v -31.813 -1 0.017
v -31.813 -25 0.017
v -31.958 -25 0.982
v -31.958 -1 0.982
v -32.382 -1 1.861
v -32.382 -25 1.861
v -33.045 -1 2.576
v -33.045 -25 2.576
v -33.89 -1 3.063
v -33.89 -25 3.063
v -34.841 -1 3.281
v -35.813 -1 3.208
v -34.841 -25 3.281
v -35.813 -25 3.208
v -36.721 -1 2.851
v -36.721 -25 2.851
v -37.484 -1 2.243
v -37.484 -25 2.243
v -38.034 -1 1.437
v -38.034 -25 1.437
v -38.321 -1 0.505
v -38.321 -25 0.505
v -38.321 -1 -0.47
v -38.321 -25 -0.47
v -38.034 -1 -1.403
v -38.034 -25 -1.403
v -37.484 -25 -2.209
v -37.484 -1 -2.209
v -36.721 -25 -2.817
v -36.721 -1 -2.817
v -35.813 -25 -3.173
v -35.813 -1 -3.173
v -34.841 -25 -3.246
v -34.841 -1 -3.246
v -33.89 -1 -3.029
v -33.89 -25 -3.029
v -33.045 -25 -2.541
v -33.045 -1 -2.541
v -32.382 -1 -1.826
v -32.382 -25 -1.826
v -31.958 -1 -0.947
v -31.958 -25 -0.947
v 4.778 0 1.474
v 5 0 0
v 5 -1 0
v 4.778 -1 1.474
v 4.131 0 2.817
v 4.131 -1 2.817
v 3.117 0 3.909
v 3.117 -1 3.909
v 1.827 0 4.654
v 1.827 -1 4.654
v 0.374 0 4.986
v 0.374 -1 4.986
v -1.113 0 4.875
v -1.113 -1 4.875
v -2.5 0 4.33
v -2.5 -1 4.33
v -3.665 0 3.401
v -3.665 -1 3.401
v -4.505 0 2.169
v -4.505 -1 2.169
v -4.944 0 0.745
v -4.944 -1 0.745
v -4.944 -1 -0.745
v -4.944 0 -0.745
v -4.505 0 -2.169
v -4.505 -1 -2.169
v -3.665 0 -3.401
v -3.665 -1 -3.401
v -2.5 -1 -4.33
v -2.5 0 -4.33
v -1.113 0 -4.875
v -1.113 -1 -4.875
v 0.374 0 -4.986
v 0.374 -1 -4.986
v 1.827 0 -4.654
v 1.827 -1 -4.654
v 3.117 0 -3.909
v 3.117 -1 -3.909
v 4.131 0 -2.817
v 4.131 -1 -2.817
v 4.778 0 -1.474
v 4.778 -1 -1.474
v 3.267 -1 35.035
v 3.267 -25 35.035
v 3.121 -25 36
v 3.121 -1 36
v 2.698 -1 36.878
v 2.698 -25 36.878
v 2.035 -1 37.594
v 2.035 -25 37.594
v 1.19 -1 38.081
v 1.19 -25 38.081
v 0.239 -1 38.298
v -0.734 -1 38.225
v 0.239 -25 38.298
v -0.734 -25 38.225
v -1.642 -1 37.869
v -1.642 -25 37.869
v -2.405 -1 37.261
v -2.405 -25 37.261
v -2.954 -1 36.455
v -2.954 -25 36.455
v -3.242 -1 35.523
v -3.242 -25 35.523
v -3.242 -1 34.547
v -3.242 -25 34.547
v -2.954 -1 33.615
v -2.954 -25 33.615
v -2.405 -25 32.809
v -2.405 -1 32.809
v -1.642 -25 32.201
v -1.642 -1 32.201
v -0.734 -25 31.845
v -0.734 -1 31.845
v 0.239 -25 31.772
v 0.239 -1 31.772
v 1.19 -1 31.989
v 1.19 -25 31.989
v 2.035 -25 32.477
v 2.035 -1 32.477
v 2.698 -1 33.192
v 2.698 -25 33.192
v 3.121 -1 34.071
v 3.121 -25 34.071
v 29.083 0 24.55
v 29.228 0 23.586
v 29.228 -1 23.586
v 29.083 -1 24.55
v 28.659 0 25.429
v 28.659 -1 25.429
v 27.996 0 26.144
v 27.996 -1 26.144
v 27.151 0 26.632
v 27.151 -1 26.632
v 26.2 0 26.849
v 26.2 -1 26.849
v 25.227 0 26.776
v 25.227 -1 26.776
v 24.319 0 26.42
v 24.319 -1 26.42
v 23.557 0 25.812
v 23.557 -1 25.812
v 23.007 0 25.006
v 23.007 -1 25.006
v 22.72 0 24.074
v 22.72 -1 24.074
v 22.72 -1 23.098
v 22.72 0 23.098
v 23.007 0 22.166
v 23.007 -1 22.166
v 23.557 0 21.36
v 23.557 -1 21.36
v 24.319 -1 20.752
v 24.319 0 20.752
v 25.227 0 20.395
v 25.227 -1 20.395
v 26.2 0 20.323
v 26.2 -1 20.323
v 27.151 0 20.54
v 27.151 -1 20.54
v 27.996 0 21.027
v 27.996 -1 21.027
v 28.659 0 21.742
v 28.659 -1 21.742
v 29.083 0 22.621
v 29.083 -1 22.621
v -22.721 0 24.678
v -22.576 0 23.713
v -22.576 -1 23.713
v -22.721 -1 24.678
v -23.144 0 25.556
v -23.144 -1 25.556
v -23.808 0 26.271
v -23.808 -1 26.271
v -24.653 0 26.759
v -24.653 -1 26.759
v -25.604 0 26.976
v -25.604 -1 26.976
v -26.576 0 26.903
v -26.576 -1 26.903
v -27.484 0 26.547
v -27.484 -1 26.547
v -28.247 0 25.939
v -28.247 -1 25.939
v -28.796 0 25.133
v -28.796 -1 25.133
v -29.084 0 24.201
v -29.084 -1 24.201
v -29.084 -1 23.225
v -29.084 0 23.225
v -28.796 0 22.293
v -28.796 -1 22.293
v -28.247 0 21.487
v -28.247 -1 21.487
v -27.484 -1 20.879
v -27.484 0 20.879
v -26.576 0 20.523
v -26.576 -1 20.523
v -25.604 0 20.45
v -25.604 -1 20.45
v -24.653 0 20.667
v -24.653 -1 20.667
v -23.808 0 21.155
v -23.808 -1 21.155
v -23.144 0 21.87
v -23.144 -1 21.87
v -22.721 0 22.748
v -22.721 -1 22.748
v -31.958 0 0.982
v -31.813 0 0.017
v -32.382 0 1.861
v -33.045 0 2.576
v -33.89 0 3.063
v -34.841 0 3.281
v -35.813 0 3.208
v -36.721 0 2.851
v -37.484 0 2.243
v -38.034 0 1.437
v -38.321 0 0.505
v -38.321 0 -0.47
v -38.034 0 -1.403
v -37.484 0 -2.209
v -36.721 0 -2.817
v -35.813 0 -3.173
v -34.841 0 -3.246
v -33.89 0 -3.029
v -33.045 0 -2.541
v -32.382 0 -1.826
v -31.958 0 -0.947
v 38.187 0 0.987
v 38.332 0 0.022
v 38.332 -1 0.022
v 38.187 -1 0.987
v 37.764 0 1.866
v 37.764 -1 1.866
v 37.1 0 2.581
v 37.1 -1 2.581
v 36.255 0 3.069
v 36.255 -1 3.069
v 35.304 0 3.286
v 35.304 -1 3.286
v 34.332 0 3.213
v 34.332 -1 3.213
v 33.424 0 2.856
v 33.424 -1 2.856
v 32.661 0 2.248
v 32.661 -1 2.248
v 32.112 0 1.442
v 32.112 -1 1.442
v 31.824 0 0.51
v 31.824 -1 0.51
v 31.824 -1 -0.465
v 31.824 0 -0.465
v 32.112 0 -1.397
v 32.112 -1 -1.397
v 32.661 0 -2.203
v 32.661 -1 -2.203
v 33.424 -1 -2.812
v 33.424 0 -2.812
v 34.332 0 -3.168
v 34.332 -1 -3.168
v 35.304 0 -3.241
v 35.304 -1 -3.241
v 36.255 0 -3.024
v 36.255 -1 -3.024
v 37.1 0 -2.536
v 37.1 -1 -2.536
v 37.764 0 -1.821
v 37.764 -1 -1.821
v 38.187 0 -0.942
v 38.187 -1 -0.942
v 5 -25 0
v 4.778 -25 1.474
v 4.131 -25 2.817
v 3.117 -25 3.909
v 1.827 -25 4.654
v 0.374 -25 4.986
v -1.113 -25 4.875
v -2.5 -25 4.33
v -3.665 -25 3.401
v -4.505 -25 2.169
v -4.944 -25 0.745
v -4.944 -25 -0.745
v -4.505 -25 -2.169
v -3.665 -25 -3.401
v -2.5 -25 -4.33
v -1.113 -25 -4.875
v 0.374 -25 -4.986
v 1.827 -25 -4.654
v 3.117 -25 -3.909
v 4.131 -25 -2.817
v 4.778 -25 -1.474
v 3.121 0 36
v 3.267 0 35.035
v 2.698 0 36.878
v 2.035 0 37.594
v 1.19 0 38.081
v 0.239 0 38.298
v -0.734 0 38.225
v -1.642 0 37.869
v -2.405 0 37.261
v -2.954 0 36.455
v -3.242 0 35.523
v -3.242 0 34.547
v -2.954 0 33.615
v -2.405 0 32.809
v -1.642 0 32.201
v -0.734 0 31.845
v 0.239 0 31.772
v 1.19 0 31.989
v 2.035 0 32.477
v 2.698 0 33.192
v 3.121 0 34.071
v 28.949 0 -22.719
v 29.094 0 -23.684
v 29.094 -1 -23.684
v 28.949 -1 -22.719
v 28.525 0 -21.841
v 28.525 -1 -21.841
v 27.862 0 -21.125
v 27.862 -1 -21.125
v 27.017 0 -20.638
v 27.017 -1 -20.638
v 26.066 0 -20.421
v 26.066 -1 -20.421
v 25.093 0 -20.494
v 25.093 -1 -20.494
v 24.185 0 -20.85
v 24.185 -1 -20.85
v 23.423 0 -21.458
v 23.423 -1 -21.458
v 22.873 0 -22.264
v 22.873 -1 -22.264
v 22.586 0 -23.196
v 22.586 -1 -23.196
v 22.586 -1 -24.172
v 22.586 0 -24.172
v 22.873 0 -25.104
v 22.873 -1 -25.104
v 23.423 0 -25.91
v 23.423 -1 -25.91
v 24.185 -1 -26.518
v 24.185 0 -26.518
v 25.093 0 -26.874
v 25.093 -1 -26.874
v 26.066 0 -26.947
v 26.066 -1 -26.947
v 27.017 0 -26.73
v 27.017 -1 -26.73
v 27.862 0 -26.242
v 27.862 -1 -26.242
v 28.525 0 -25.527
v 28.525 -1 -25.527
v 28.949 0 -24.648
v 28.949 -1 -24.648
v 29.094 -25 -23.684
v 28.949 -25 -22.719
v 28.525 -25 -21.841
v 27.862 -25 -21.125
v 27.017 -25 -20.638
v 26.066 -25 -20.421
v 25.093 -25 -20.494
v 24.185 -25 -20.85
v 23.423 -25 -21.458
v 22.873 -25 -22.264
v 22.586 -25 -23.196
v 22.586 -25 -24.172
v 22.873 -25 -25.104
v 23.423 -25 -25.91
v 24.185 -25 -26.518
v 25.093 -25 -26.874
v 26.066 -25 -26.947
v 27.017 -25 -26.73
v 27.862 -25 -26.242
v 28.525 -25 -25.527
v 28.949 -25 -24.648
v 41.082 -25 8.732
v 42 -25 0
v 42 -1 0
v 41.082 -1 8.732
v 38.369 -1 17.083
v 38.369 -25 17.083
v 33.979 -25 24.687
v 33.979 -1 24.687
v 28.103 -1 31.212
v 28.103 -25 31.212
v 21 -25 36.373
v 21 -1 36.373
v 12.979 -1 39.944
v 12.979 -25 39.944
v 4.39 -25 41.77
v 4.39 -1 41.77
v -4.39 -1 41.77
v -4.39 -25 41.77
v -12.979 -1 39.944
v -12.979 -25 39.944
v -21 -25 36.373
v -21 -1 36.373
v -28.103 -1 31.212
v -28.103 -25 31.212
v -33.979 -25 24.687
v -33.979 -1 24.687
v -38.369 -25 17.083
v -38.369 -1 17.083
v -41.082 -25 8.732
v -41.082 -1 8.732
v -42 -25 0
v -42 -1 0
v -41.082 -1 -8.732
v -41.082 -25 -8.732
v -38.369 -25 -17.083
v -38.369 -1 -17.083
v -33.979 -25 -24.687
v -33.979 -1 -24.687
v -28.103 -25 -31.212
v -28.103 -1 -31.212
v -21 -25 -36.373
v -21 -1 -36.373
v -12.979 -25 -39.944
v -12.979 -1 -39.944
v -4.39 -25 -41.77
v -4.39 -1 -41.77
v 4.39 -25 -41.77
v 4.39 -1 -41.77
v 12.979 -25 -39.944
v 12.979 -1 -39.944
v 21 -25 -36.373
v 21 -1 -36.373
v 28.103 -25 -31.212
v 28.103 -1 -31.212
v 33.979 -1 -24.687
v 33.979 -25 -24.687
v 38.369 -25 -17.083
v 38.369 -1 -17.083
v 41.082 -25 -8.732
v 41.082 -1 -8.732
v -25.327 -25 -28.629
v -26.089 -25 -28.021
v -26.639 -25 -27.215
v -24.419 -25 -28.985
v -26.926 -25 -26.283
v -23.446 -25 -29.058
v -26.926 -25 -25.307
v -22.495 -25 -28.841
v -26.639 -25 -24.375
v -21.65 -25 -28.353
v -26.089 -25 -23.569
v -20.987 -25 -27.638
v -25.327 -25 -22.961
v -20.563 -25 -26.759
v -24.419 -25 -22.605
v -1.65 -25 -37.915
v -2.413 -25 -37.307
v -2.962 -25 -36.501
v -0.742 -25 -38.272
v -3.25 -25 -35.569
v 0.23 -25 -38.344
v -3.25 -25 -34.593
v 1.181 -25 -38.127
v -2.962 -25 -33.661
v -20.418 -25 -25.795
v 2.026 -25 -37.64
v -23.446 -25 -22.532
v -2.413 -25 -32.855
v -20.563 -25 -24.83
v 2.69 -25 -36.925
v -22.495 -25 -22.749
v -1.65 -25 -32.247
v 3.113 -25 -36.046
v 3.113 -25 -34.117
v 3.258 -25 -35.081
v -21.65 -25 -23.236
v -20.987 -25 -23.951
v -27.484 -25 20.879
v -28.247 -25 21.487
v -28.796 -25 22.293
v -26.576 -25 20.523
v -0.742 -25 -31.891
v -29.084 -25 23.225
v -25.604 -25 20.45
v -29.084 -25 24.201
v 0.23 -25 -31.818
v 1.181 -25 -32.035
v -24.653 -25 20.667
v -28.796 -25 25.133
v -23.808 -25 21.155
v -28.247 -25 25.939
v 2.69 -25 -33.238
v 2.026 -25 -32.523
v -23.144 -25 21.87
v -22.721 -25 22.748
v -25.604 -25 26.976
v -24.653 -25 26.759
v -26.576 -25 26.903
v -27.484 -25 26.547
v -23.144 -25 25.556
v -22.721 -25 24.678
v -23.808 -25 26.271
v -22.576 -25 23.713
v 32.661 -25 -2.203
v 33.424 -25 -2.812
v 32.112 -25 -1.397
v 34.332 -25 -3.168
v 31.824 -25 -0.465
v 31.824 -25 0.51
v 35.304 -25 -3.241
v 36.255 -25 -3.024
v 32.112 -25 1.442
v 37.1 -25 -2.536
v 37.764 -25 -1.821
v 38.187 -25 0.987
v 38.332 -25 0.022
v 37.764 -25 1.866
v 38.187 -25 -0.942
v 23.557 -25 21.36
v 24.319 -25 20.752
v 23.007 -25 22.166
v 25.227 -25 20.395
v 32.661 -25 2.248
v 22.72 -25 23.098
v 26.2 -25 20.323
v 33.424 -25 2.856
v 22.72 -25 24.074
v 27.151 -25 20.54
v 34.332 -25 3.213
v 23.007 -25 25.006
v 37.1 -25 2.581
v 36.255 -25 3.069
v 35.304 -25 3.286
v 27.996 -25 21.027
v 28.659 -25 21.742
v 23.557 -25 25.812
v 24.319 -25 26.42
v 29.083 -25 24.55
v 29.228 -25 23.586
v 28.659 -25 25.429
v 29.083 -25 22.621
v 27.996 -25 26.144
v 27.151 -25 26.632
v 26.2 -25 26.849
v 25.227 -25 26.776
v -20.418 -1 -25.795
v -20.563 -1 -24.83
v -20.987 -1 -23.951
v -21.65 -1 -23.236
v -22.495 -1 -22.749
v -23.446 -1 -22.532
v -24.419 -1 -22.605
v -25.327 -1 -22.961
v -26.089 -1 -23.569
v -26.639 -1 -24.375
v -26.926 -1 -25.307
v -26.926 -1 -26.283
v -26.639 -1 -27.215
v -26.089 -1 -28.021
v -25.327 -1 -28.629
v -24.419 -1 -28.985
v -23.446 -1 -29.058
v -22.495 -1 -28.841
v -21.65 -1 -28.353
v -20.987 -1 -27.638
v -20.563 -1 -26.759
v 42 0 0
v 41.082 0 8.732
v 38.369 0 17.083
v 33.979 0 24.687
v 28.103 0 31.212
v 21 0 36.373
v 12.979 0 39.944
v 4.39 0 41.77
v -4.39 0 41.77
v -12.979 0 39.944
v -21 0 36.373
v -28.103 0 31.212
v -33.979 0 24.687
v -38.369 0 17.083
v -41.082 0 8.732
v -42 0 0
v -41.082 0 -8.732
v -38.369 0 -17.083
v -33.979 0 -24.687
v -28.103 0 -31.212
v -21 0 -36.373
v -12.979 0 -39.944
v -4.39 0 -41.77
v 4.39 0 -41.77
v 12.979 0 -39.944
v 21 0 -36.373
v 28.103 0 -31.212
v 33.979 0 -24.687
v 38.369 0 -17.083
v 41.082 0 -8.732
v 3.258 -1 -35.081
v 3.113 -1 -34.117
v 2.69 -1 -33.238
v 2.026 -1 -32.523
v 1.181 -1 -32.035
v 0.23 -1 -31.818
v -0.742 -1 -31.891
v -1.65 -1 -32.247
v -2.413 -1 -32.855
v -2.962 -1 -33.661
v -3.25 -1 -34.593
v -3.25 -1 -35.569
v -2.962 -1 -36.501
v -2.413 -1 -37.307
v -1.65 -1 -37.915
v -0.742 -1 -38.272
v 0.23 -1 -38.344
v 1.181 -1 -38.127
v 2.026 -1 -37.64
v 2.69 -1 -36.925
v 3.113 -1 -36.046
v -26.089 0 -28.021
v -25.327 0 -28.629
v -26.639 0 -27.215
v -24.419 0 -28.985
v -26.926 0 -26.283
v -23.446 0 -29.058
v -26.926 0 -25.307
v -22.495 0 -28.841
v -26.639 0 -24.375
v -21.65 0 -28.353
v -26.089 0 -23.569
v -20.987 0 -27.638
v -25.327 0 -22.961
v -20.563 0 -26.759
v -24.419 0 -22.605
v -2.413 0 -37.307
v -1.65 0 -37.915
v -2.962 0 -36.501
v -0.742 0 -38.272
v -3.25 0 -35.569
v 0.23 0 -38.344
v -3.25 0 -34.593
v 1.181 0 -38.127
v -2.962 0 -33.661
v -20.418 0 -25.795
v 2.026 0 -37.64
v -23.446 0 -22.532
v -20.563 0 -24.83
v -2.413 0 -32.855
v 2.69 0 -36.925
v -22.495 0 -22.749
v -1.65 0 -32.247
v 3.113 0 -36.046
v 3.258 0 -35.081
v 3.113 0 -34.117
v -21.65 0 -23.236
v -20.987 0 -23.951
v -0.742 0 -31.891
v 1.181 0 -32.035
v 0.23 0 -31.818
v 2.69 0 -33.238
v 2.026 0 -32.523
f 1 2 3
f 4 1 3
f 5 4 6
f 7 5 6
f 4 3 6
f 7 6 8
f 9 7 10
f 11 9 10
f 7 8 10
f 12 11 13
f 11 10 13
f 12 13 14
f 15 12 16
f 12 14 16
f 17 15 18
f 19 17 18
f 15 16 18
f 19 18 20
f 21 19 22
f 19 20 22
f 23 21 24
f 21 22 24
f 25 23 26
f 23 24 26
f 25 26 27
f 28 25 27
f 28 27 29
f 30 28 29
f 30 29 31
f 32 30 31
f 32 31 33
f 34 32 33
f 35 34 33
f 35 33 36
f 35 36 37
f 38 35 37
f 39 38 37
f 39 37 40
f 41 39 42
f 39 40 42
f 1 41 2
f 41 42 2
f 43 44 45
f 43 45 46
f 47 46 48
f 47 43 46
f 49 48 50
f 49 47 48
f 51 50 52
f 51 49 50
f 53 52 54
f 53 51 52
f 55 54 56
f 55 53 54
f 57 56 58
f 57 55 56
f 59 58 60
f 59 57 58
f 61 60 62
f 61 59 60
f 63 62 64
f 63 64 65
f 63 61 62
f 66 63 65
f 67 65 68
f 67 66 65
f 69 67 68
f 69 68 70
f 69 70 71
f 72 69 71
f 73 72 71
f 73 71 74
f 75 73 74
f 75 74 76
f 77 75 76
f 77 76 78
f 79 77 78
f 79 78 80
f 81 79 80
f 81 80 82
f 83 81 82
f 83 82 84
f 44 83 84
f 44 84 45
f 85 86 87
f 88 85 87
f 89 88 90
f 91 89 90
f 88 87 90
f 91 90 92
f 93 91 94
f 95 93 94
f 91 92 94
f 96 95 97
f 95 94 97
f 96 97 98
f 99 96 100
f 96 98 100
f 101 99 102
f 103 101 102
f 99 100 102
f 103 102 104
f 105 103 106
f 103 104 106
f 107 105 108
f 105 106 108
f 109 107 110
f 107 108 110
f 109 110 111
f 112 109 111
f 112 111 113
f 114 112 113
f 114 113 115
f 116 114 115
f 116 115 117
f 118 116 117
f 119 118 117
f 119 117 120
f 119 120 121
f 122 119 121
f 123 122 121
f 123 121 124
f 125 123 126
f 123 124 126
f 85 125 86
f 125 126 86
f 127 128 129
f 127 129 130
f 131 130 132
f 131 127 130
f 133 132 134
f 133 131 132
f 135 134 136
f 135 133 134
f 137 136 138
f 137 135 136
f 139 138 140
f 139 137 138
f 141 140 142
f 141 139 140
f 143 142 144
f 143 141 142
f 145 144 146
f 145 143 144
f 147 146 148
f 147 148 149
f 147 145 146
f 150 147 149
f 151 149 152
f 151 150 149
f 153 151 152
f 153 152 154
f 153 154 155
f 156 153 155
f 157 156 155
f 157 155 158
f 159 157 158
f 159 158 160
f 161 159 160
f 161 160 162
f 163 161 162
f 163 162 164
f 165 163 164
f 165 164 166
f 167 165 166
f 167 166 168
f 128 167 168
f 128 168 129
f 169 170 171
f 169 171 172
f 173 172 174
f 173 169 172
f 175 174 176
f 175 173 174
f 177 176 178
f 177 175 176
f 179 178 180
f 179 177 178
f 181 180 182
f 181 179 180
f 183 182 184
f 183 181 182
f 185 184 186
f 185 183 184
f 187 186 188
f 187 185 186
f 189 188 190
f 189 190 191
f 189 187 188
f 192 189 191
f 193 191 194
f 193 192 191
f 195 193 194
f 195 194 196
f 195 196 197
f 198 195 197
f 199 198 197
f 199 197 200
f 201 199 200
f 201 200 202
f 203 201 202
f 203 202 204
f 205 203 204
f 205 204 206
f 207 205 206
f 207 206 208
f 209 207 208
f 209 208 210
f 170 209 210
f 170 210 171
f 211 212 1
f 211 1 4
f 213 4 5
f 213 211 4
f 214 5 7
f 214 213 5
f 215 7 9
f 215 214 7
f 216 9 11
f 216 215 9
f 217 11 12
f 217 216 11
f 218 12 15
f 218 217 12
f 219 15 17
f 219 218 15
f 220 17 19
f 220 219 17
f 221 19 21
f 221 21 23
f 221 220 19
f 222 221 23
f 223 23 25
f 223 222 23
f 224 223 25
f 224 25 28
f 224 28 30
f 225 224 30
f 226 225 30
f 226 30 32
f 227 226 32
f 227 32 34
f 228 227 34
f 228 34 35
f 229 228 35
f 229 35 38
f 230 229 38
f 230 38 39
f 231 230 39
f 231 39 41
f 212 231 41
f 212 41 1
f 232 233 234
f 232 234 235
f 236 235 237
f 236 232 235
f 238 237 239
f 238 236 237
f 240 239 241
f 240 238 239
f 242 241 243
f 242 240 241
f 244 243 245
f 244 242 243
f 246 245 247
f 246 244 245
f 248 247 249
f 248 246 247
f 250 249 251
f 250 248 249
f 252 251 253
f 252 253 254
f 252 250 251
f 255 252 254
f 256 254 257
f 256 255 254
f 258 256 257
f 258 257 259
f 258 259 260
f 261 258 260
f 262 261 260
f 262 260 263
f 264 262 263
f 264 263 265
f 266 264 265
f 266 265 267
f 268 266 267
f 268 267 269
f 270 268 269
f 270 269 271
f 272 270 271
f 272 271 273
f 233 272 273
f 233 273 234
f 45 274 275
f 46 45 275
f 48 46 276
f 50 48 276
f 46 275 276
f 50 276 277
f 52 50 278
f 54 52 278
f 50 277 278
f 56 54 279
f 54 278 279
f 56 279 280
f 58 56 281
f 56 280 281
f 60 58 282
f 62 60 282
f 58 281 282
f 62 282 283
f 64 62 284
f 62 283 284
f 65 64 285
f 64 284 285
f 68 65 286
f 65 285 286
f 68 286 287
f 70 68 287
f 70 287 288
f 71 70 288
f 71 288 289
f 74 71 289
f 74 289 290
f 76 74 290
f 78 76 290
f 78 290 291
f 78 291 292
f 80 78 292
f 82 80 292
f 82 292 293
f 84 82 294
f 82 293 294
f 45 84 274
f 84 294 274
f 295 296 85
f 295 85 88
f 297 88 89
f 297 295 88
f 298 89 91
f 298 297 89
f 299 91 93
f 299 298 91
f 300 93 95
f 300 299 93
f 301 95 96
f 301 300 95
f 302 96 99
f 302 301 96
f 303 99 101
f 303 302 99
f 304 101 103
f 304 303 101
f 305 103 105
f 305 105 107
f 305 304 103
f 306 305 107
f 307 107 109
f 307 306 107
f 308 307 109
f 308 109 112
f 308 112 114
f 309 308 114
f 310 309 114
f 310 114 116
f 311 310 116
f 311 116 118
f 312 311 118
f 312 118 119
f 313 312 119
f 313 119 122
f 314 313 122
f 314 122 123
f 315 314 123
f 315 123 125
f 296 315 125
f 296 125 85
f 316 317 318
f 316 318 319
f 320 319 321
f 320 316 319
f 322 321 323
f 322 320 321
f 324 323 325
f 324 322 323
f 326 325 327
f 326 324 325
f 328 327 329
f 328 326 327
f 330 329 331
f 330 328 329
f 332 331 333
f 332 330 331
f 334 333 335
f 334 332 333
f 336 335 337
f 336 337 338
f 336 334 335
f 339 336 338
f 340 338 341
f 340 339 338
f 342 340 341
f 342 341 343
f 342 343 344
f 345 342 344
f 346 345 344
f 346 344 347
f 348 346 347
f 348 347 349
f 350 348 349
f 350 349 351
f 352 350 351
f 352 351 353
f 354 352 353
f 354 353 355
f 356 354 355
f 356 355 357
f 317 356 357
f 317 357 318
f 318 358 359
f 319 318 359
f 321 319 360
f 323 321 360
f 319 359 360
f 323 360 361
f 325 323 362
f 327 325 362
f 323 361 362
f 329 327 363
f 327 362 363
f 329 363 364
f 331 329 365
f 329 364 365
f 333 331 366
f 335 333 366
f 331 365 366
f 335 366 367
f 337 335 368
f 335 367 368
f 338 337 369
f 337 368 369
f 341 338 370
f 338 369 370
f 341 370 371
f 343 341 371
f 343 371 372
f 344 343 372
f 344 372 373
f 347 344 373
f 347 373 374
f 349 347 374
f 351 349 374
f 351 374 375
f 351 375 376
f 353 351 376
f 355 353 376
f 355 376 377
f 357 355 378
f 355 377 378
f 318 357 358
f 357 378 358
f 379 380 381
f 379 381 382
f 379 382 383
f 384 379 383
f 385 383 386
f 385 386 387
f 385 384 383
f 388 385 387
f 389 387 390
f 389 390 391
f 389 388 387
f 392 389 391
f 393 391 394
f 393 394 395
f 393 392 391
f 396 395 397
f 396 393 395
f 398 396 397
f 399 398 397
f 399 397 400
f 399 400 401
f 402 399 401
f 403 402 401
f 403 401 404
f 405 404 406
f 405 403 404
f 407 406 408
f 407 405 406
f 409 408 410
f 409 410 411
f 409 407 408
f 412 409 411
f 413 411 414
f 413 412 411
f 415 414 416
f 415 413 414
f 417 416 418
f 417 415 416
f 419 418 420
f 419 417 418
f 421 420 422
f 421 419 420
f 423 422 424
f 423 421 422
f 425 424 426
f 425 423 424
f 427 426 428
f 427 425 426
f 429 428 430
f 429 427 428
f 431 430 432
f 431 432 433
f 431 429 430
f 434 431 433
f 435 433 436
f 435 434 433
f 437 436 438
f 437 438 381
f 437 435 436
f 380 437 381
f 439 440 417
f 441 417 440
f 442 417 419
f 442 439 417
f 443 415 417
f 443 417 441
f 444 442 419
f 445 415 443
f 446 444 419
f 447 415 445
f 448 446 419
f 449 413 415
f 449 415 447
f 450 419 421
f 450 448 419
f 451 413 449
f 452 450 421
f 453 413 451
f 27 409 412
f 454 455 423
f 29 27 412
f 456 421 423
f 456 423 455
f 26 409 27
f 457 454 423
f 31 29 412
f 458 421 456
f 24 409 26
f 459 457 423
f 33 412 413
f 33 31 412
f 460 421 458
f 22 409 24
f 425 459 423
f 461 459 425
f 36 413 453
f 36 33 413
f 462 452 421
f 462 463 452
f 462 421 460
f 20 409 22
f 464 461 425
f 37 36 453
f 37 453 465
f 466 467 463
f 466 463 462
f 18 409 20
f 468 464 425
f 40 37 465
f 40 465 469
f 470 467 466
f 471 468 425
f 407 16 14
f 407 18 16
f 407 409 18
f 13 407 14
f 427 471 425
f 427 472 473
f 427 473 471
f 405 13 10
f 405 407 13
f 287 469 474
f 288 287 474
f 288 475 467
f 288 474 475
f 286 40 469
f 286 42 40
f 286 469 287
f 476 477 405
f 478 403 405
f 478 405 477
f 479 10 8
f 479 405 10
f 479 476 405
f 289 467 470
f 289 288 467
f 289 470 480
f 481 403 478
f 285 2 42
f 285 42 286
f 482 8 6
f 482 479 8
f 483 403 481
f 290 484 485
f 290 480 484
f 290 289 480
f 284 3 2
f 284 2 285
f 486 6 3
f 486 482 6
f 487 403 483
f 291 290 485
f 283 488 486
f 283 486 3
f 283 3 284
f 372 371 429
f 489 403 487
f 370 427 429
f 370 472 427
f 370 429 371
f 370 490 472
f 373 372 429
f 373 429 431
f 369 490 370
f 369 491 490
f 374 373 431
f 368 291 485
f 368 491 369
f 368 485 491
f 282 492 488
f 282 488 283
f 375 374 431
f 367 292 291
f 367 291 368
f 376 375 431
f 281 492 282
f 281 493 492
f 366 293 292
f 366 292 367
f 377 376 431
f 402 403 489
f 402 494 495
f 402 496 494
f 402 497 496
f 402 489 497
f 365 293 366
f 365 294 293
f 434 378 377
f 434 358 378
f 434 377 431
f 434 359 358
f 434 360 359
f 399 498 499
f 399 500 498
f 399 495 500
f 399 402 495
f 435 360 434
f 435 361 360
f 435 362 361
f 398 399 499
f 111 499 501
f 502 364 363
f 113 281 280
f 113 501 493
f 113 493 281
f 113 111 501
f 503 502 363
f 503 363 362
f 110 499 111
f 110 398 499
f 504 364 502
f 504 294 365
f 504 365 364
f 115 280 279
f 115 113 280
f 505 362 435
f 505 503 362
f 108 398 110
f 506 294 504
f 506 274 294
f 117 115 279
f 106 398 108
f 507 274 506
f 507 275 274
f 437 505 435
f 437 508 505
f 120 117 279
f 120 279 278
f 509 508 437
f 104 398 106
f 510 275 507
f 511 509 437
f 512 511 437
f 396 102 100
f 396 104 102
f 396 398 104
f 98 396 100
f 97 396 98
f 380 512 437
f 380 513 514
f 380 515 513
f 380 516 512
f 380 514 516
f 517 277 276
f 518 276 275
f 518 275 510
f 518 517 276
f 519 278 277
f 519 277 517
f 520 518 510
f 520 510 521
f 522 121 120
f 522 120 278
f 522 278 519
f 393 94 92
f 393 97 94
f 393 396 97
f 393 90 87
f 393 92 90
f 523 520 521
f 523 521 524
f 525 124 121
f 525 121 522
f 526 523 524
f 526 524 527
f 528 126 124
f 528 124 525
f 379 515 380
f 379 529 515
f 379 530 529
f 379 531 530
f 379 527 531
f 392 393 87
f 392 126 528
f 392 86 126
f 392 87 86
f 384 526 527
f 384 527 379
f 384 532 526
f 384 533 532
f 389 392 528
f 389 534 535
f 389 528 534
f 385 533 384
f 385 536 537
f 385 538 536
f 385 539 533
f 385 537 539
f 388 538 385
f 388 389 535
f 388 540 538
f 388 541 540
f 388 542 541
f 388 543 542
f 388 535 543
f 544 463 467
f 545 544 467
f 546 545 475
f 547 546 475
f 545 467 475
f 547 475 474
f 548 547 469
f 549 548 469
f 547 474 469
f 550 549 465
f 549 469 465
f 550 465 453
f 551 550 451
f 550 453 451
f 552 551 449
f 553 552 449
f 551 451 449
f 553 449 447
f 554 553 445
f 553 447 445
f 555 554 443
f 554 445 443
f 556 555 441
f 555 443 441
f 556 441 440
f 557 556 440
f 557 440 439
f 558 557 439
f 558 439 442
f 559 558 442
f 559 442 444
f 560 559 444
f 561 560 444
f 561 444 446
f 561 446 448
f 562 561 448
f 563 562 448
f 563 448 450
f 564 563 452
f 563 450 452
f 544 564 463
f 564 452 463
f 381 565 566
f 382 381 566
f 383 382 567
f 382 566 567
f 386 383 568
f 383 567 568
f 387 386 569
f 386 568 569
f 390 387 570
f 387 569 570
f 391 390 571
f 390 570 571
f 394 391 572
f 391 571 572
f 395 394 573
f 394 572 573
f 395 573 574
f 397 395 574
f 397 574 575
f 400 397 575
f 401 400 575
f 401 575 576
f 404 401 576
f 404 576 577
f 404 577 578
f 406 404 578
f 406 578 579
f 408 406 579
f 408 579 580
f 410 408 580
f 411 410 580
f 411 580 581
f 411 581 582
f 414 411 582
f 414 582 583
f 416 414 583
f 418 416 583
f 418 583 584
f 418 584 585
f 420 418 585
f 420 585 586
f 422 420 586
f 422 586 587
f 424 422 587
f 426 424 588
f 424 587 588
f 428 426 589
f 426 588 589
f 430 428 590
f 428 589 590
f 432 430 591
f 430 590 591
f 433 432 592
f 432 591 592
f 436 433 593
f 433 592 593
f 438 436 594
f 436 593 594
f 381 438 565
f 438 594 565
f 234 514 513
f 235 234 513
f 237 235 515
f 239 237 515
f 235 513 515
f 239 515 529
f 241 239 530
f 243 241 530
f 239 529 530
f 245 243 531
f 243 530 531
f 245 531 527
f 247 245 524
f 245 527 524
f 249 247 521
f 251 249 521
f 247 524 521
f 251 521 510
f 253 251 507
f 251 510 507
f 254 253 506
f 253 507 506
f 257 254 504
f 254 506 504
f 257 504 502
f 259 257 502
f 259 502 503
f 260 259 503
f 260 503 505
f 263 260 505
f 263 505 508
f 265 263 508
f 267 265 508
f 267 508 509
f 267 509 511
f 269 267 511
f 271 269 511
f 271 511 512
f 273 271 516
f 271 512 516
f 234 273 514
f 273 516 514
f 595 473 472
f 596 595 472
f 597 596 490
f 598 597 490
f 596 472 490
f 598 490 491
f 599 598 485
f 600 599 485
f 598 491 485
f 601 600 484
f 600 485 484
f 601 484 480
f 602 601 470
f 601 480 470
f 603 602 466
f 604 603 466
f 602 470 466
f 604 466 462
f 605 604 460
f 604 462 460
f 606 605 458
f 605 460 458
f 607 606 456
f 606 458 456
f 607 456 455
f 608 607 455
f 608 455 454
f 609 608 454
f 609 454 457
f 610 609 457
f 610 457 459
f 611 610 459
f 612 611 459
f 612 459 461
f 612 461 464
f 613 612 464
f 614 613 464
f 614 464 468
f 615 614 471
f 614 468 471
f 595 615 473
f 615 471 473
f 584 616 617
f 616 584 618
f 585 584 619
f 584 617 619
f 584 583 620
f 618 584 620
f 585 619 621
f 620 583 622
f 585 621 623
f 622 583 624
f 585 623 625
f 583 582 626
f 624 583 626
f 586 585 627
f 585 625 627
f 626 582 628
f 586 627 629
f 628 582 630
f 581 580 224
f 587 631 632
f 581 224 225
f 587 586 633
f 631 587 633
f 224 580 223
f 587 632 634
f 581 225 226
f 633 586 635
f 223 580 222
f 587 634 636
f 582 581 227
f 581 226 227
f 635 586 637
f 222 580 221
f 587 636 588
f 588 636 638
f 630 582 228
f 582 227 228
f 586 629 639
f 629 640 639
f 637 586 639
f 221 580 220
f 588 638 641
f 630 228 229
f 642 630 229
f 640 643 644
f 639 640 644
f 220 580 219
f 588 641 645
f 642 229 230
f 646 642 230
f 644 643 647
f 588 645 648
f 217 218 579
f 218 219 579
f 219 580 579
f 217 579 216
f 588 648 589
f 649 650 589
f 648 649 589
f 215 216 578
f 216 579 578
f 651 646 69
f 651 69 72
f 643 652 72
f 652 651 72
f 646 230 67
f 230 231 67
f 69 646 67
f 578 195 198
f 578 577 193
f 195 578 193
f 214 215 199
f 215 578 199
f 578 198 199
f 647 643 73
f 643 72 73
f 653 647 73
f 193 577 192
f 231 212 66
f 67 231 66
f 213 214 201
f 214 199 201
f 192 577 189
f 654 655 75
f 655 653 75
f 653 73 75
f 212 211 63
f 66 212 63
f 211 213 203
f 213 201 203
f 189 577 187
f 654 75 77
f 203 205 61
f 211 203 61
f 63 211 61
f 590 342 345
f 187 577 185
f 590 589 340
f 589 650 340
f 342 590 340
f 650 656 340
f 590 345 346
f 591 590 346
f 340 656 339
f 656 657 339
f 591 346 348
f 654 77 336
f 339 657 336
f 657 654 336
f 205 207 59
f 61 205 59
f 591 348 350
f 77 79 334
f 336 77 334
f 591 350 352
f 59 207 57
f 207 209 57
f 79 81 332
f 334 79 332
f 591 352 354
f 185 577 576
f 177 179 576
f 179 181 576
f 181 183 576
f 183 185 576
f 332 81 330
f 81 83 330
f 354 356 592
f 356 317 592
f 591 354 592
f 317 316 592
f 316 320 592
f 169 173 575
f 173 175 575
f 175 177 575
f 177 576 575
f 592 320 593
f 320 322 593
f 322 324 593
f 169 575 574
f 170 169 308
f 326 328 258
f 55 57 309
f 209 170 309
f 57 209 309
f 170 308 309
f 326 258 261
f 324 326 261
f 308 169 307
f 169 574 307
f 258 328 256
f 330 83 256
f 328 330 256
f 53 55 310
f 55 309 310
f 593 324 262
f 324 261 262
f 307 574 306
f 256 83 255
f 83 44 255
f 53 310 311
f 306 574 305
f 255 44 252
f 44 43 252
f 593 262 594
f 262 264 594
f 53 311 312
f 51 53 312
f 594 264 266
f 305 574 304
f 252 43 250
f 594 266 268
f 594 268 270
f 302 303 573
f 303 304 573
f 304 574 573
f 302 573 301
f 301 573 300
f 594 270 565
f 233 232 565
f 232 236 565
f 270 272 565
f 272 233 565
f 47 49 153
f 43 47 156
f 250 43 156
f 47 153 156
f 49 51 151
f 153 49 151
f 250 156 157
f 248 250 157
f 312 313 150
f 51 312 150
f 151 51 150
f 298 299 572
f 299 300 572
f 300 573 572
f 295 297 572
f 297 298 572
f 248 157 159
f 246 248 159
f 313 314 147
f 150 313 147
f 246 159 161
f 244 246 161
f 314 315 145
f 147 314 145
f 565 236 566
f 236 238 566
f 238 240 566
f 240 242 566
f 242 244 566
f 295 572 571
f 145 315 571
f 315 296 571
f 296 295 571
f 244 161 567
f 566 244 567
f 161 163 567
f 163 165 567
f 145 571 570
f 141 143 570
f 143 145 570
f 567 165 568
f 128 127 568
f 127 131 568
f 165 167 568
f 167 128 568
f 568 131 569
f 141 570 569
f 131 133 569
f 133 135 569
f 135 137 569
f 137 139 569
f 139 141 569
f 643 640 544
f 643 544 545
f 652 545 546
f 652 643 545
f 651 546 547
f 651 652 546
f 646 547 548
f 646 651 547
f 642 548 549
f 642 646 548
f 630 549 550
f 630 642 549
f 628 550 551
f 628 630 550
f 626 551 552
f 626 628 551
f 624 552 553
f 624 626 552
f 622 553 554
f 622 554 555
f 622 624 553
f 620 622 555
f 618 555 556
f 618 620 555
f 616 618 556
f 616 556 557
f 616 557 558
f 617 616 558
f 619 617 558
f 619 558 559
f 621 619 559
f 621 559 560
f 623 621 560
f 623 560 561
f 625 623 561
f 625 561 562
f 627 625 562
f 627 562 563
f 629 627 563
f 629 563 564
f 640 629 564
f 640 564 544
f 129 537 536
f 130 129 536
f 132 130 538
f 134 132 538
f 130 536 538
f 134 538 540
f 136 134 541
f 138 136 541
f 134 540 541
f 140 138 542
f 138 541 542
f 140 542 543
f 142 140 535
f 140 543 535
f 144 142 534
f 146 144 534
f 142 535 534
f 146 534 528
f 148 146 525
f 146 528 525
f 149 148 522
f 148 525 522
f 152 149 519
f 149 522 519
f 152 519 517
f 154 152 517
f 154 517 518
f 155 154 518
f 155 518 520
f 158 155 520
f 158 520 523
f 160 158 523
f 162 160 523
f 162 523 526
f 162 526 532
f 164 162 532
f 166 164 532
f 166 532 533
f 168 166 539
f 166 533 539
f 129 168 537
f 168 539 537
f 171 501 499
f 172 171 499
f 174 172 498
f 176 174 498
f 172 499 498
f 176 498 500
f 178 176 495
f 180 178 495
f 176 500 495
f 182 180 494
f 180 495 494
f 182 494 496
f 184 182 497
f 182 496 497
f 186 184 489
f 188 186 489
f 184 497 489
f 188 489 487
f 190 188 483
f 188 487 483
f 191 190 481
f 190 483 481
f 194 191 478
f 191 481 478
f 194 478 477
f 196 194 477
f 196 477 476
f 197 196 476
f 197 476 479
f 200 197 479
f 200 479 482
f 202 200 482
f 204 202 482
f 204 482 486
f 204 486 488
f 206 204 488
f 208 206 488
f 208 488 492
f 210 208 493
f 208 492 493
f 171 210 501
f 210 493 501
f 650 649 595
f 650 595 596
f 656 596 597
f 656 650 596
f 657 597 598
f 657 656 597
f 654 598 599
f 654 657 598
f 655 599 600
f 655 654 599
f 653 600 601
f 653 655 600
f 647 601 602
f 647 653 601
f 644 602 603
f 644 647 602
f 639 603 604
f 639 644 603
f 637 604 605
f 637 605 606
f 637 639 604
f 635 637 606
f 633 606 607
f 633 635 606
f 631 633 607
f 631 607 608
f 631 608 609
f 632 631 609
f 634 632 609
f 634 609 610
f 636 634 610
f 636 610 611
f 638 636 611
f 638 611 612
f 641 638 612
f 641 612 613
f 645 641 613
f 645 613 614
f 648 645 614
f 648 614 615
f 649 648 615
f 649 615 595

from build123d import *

# Parameters (mm, degrees)
F0_R     = 42
F0_R_2   = 3.2723941489
F0_R_3   = 15
F0_R_4   = 8.75
F1_DEPTH = 25
F0_R_5   = 5
F2_DEPTH = 25
F7_DEPTH = 24


# Not quite as in the source:
# - the program builds the solid bodies; features that only make, move or delete a surface that nothing else refers to are left out


with BuildPart() as f1:
    # F0 (on Front) → F1 (new body)
    with BuildSketch(Plane.XZ):
        Circle(F0_R)
        with Locations((-23.6904930325, -25.7949024873)):
            Circle(F0_R_2, mode=Mode.SUBTRACT)
        with Locations((-0.0140495196, -35.0812149592)):
            Circle(F0_R_2, mode=Mode.SUBTRACT)
        with Locations((25.8215879073, -23.6839220737)):
            Circle(F0_R_2, mode=Mode.SUBTRACT)
        with Locations((-35.0852801235, 0.0172716529)):
            Circle(F0_R_2, mode=Mode.SUBTRACT)
        with Locations((-25.8480679978, 23.7130210266)):
            Circle(F0_R_2, mode=Mode.SUBTRACT)
        with Locations((-0.0057062035, 35.0350632497)):
            Circle(F0_R_2, mode=Mode.SUBTRACT)
        Circle(F0_R_3, mode=Mode.SUBTRACT)
        with Locations((35.0598417296, 0.0224386821)):
            Circle(F0_R_2, mode=Mode.SUBTRACT)
        with Locations((25.9556279527, 23.5858062447)):
            Circle(F0_R_2, mode=Mode.SUBTRACT)
        Circle(F0_R_3)
        Circle(F0_R_4, mode=Mode.SUBTRACT)
    extrude(amount=F1_DEPTH)

    # F0 (on Front) → F2 (join)
    with BuildSketch(Plane.XZ):
        Circle(F0_R_4)
        Circle(F0_R_5, mode=Mode.SUBTRACT)
    extrude(amount=F2_DEPTH)

    # F7 (add): a face of the model
    f7_faces = [f1.faces().sort_by_distance(p)[0] for p in [
        (-40.8120606076, -25, 0),
    ]]
    extrude(f7_faces, amount=-F7_DEPTH)


solid = f1.part
